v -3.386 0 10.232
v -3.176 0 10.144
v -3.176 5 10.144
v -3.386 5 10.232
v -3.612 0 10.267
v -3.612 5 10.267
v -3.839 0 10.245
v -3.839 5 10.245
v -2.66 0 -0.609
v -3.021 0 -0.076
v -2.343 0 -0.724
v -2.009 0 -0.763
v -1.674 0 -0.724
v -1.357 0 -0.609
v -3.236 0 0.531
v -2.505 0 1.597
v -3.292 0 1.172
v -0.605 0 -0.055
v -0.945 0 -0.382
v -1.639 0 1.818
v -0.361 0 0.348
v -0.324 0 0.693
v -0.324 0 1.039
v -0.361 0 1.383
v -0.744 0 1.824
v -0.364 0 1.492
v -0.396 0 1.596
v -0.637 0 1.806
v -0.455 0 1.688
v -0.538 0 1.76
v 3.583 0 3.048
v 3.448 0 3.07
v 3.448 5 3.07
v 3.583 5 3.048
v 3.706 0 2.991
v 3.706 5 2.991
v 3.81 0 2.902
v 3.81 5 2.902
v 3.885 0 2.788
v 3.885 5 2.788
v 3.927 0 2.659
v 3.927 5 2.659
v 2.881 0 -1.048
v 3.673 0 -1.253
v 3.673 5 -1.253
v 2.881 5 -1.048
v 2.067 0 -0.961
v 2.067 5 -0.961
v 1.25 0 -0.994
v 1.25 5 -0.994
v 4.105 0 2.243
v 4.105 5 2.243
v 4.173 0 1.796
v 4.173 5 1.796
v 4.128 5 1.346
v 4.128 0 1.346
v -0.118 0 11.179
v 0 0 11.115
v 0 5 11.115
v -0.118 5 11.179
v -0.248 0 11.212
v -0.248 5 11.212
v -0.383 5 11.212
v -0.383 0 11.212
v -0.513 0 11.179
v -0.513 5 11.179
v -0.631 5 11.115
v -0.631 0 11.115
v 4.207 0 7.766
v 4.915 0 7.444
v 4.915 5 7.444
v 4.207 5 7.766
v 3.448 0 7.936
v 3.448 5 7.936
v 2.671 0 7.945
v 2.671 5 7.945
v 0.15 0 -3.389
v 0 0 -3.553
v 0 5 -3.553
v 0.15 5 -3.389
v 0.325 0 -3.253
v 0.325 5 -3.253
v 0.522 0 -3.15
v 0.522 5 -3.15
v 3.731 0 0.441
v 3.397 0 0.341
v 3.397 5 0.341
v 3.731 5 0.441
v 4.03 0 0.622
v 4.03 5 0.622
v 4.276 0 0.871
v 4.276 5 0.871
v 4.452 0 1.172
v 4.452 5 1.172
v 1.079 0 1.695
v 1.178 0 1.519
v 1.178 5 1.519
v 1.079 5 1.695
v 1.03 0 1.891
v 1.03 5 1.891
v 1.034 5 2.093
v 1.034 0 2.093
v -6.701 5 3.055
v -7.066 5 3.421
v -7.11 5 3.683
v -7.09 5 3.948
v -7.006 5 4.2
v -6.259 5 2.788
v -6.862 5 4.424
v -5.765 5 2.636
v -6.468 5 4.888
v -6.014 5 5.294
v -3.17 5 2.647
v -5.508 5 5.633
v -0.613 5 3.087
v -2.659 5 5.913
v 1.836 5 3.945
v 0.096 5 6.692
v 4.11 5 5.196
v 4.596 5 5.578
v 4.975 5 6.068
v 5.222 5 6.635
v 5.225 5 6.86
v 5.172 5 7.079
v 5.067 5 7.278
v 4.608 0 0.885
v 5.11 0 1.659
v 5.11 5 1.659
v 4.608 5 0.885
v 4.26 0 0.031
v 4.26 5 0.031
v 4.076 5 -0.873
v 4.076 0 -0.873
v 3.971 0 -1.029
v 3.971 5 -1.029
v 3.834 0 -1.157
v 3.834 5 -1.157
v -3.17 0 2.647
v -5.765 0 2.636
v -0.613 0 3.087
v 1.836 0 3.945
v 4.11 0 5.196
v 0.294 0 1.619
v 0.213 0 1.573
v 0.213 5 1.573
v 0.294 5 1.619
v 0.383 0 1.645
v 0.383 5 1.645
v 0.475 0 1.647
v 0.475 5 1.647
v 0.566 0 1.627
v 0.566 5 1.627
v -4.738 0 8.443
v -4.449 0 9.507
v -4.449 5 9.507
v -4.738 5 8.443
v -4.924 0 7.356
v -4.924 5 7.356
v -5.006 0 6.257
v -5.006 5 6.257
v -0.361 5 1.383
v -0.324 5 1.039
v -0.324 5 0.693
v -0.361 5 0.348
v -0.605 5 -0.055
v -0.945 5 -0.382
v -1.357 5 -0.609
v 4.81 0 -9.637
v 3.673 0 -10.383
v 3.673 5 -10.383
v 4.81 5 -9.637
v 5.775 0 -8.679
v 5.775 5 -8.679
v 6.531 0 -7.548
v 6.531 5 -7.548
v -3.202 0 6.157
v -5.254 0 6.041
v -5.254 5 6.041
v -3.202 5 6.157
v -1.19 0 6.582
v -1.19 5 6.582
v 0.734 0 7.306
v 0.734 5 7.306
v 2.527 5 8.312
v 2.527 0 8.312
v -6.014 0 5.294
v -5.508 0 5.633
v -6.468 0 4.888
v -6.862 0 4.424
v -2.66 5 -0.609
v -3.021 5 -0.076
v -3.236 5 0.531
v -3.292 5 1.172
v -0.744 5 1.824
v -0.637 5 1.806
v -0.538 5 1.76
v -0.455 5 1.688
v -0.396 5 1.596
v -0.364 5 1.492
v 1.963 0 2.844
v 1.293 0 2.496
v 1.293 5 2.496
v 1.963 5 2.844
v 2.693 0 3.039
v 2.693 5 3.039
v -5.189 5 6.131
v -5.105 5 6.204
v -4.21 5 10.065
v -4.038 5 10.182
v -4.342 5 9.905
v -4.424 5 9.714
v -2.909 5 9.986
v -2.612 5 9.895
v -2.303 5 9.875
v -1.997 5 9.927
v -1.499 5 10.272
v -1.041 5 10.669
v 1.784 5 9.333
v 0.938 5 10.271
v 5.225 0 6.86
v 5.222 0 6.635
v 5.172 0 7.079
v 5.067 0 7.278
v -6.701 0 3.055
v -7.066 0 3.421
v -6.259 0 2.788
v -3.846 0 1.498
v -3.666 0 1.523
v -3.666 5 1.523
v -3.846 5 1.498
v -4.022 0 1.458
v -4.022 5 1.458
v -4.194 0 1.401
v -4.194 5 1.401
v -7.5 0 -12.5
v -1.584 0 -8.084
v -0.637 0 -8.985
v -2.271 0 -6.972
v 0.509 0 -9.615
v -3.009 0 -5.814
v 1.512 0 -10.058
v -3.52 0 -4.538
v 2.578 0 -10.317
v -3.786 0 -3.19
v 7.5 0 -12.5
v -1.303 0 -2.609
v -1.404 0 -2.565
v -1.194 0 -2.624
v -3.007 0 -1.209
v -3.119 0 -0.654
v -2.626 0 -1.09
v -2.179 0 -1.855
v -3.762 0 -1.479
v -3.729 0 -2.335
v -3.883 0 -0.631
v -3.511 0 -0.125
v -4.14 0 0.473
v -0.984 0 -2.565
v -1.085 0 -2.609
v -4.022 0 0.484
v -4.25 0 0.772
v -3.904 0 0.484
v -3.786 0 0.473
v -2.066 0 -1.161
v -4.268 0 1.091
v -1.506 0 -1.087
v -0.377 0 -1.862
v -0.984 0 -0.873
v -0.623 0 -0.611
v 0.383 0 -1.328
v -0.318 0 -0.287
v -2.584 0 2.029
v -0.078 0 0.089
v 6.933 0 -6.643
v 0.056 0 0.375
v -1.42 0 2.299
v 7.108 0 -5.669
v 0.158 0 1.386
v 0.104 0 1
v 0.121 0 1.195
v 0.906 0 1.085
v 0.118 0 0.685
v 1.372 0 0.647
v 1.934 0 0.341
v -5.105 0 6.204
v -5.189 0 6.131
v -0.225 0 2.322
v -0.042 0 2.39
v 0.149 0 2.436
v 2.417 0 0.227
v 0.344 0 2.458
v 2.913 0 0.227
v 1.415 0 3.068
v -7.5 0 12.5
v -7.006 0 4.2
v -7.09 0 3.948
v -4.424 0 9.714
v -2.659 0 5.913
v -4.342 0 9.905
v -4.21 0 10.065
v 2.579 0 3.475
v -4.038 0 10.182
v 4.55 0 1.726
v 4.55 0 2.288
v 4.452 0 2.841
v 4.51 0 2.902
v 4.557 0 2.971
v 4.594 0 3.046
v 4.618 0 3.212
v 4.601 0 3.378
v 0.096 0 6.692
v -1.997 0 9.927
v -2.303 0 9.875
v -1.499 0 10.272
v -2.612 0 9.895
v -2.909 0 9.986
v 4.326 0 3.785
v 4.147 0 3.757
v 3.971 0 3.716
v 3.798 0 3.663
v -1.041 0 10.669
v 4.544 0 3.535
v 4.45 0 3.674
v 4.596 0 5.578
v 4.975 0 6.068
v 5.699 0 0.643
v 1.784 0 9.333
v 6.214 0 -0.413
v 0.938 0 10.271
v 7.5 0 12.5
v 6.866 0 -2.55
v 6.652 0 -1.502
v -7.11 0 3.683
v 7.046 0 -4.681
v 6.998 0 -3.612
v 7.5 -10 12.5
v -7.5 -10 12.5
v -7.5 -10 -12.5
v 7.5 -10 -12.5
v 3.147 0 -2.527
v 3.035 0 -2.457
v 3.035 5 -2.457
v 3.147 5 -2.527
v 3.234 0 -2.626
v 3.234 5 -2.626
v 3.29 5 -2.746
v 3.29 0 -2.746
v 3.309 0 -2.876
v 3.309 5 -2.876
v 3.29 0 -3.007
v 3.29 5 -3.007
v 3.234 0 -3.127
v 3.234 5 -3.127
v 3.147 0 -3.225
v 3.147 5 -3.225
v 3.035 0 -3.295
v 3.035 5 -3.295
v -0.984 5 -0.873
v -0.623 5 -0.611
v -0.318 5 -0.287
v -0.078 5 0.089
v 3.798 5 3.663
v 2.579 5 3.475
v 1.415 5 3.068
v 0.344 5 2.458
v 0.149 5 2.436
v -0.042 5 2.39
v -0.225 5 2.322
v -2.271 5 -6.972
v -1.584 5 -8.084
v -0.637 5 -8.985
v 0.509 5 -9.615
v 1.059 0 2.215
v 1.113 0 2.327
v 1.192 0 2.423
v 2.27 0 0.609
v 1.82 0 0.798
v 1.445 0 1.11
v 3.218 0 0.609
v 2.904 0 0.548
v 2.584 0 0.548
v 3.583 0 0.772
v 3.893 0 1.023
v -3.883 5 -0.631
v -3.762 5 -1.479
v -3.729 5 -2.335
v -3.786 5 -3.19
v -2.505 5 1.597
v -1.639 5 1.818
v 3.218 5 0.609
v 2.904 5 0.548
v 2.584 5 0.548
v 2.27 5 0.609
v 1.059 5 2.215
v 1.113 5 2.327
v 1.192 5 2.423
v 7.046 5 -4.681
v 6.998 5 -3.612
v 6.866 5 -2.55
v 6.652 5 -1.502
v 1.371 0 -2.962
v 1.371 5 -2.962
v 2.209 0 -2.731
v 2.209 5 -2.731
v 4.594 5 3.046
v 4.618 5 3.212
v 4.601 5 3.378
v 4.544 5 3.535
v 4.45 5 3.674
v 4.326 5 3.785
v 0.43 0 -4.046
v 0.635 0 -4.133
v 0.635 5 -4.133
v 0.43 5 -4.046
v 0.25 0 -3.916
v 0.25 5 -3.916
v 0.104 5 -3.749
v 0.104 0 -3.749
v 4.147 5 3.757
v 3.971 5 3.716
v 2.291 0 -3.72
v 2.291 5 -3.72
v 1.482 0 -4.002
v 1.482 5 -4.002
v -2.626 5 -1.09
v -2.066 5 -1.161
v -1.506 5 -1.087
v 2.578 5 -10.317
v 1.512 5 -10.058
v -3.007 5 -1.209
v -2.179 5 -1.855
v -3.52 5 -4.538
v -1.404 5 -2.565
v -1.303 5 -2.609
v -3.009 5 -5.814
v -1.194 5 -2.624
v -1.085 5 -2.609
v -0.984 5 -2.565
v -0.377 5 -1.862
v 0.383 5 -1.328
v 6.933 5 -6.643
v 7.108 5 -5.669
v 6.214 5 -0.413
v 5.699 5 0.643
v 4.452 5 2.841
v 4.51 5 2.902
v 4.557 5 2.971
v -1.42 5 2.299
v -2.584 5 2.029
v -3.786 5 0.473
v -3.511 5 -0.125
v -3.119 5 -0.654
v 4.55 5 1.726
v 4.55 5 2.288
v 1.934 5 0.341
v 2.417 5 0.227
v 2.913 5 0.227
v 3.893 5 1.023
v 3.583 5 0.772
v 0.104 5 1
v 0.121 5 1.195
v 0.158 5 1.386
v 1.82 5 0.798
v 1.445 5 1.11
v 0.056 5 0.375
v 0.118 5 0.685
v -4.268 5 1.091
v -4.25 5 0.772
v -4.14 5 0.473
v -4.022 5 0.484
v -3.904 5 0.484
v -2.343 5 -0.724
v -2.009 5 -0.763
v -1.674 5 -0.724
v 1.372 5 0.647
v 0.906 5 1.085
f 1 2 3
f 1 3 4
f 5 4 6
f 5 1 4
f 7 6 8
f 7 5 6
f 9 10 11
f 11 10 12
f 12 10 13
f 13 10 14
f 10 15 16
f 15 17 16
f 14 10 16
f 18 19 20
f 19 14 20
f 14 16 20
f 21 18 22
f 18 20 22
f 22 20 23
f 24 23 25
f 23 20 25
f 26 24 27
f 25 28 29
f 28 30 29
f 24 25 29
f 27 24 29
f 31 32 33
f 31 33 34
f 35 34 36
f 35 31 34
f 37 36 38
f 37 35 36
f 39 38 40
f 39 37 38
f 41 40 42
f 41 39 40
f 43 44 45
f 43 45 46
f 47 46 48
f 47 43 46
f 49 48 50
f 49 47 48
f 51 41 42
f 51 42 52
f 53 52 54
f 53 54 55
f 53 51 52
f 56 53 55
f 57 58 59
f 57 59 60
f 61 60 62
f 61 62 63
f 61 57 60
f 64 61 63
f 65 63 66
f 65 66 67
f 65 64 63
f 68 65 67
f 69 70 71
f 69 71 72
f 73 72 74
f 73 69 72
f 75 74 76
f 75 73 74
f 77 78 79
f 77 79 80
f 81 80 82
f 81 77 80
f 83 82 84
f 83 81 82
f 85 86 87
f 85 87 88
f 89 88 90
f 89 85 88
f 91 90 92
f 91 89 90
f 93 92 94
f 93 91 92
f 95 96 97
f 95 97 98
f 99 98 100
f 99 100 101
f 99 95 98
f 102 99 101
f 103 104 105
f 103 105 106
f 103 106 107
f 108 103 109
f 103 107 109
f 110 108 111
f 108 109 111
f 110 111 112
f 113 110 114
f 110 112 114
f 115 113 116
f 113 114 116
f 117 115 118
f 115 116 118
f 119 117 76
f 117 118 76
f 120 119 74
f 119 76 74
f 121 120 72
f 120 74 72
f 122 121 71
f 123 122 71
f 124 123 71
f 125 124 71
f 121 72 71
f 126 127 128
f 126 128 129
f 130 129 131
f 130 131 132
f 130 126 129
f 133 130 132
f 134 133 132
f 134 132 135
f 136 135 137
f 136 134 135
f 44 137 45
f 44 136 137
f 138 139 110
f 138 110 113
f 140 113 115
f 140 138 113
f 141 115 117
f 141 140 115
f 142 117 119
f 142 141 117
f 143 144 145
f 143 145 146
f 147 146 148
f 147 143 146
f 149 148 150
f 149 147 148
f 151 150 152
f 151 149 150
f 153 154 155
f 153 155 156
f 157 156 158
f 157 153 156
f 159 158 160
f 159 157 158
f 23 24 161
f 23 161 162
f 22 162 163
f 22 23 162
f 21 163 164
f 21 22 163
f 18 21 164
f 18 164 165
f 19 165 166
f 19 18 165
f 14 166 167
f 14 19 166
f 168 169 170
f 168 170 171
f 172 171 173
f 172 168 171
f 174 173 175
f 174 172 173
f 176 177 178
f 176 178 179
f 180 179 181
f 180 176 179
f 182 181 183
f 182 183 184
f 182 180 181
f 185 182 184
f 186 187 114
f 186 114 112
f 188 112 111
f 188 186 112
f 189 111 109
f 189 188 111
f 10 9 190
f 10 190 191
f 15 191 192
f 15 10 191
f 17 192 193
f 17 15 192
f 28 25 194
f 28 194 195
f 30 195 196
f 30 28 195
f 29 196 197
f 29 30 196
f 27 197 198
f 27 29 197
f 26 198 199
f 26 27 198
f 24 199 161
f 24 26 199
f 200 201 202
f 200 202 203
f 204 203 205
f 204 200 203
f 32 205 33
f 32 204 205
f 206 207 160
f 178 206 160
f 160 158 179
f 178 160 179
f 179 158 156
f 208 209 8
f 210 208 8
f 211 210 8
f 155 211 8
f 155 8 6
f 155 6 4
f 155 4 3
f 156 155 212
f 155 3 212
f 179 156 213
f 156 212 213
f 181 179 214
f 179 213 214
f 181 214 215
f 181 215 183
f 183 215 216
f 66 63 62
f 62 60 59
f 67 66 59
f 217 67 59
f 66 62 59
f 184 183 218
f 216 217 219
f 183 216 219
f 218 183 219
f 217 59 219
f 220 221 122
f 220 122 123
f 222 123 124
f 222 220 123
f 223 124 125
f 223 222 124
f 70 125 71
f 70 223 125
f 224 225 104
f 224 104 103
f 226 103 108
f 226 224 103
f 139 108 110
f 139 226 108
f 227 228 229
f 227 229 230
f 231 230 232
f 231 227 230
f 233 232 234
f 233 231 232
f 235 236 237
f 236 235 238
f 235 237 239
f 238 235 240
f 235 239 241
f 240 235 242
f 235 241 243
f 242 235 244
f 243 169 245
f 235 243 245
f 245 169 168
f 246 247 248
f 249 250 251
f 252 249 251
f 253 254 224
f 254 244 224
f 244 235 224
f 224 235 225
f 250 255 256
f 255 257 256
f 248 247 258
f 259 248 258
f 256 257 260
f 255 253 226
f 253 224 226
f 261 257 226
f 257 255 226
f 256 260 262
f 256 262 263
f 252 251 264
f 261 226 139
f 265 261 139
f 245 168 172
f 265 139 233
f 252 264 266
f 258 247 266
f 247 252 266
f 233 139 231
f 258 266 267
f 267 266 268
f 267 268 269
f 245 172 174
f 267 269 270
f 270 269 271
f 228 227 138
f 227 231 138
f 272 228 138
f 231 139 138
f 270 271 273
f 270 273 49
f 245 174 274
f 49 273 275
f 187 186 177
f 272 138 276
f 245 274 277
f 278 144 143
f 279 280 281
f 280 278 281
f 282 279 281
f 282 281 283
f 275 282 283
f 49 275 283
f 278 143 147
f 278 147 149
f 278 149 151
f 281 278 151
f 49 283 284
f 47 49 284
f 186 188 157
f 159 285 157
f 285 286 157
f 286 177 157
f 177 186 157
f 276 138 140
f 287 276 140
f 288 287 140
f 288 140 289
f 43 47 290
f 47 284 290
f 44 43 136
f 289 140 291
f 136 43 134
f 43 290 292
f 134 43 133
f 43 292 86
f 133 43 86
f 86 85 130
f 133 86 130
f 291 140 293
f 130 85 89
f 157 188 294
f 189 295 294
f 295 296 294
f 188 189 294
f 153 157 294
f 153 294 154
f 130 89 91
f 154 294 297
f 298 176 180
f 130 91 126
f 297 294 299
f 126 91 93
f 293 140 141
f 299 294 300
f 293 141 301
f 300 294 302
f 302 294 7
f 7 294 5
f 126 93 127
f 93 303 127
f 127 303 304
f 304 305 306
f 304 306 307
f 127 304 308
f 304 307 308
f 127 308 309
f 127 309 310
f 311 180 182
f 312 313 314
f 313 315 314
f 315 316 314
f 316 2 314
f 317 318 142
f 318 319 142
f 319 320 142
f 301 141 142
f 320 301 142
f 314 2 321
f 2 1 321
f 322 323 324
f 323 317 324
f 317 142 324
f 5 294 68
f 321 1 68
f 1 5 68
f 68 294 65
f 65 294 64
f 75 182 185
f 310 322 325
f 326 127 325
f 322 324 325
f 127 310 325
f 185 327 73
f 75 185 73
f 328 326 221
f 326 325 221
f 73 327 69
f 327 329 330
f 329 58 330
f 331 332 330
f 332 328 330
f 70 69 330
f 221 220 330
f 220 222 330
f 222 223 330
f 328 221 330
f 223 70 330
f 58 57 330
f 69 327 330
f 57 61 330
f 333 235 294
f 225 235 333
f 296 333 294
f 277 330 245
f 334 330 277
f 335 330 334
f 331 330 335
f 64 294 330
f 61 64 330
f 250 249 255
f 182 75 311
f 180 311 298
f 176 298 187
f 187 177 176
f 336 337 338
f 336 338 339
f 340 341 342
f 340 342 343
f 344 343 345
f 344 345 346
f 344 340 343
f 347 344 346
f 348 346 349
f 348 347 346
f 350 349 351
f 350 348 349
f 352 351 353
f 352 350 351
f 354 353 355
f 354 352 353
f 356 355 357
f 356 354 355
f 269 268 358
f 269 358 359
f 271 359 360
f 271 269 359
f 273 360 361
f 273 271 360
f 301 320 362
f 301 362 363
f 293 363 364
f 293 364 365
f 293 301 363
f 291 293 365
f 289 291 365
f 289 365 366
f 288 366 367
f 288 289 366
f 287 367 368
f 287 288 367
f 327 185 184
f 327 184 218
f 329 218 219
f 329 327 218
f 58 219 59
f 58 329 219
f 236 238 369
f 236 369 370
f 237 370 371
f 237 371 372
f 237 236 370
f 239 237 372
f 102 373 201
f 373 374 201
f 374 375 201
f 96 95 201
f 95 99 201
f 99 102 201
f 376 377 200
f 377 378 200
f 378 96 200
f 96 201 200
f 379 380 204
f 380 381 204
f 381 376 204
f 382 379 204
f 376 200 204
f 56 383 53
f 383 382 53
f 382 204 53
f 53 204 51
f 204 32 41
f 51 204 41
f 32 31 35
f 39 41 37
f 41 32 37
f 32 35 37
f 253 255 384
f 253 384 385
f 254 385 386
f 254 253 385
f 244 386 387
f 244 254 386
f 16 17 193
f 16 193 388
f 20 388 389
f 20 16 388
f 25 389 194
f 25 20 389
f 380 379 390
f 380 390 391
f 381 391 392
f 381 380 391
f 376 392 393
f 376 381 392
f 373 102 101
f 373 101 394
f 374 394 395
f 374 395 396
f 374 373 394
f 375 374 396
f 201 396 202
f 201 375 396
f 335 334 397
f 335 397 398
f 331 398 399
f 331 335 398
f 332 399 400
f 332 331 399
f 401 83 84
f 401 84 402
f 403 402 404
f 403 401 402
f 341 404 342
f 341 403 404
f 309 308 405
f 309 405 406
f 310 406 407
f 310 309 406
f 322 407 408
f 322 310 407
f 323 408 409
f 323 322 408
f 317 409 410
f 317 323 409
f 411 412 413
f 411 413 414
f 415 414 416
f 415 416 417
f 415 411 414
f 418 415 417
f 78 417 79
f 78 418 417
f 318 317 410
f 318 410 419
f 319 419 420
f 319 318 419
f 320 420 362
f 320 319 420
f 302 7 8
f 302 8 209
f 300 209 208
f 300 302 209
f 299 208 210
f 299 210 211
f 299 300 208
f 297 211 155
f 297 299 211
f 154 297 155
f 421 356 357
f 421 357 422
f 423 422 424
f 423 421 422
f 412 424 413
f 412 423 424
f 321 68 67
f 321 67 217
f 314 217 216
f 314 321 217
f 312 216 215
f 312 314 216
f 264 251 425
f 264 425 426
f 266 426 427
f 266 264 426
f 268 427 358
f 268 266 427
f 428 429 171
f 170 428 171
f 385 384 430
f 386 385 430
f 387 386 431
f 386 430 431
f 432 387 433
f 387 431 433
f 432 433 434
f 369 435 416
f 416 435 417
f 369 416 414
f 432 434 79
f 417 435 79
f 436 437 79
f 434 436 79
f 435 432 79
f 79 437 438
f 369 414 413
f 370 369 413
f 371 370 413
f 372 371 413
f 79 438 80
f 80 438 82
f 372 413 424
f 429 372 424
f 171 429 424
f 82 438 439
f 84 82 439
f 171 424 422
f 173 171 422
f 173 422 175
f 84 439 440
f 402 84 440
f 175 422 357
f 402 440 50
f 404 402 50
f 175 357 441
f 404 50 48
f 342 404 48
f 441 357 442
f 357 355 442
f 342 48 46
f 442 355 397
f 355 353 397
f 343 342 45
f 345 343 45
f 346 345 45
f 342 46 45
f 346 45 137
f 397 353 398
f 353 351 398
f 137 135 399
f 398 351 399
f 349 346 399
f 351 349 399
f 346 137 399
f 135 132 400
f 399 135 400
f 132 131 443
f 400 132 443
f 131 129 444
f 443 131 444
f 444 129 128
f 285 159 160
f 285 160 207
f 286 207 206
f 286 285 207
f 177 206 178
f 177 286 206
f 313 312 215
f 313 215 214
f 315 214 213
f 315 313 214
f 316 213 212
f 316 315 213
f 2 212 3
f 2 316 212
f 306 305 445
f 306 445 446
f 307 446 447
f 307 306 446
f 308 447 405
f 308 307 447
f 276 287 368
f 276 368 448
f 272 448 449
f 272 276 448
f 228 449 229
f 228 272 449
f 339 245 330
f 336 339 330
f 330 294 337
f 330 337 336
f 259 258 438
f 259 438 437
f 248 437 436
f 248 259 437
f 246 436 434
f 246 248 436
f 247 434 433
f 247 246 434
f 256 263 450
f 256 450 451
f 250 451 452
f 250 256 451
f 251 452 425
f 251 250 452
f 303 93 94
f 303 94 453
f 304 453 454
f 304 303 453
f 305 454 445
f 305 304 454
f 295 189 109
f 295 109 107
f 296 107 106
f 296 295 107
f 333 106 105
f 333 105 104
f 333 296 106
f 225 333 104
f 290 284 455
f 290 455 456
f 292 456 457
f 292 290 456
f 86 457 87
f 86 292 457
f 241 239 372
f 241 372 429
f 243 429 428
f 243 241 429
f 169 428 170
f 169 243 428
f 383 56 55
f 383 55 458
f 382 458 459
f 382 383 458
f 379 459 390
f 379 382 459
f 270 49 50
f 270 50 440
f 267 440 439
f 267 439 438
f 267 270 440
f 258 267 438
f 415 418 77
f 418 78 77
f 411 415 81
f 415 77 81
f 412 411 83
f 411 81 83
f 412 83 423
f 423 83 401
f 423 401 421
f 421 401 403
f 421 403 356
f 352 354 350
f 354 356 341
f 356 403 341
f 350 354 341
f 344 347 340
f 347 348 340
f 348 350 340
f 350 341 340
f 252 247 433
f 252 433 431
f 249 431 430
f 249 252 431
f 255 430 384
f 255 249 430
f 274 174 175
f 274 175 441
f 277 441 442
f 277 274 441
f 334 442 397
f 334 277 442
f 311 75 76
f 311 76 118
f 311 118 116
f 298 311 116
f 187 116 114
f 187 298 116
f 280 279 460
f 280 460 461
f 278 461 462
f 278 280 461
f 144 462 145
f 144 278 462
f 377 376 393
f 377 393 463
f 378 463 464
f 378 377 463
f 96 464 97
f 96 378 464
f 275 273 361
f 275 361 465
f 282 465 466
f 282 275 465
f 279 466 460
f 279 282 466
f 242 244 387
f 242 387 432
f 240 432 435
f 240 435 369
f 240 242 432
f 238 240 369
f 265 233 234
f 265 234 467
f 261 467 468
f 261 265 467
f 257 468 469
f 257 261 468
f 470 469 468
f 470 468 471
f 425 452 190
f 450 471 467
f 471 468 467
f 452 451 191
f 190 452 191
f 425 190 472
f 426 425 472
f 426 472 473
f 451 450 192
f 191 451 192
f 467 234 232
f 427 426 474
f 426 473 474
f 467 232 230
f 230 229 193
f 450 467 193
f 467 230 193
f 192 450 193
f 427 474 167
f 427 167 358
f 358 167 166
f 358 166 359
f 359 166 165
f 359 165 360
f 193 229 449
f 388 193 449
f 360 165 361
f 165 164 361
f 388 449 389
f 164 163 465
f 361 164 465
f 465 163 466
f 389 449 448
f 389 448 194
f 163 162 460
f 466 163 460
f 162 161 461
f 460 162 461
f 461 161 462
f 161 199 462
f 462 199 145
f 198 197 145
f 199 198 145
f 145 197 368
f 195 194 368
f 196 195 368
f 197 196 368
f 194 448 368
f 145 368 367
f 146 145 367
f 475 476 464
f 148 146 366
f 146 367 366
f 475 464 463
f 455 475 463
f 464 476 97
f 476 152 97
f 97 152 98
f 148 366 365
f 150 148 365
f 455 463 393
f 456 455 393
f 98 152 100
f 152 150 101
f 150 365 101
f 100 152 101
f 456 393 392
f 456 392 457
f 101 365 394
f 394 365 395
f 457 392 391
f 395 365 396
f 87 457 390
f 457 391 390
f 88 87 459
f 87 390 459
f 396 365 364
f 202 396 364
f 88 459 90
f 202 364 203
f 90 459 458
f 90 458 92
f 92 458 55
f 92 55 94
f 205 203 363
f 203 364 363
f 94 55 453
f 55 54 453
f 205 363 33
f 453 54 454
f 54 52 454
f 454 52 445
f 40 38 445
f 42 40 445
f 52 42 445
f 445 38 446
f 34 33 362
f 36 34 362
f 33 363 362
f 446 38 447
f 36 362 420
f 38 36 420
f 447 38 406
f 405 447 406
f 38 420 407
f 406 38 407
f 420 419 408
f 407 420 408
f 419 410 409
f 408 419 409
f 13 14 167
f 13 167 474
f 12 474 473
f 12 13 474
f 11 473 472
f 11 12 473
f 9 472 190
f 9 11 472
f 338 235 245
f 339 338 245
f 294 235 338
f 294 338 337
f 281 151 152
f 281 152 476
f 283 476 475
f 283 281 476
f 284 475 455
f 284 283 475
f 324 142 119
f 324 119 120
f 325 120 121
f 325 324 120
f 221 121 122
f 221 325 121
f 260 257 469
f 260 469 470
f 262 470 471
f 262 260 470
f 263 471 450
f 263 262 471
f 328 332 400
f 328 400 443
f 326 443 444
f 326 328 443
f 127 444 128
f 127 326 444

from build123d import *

# Parameters (mm, degrees)
F1_DEPTH = 5
F0_W     = 15
F0_H     = 25
F2_DEPTH = 10


with BuildPart() as f1:
    # F0 (on Front) → F1 (new body)
    with BuildSketch(Plane.XZ):
        with BuildLine():
            ThreePointArc((-5.00635, 6.25683), (-5.148587, 6.169676), (-5.254236, 6.04058))
            ThreePointArc((-5.254236, 6.04058), (-1.190227, 6.581507), (2.526522, 8.311981))
            ThreePointArc((2.526522, 8.311981), (1.373353, 9.812717), (0, 11.114988))
            ThreePointArc((0, 11.114988), (-0.315443, 11.216341), (-0.630887, 11.114988))
            ThreePointArc((-0.630887, 11.114988), (-1.26458, 10.464133), (-1.997163, 9.927009))
            ThreePointArc((-1.997163, 9.927009), (-2.612192, 9.895255), (-3.175682, 10.143748))
            ThreePointArc((-3.175682, 10.143748), (-3.498132, 10.256169), (-3.839445, 10.245345))
            ThreePointArc((-3.839445, 10.245345), (-4.281874, 9.989859), (-4.449024, 9.507078))
            ThreePointArc((-4.449024, 9.507078), (-4.844139, 7.901922), (-5.00635, 6.25683))
        make_face()
        with BuildLine():
            ThreePointArc((2.670606, 7.945094), (-1.26384, 6.241031), (-5.508093, 5.632733))
            ThreePointArc((-5.508093, 5.632733), (-6.248118, 5.09859), (-6.862471, 4.42367))
            ThreePointArc((-6.862471, 4.42367), (-7.089863, 3.94796), (-7.065664, 3.421252))
            ThreePointArc((-7.065664, 3.421252), (-6.488114, 2.908136), (-5.765229, 2.635573))
            ThreePointArc((-5.765229, 2.635573), (-0.612764, 3.086873), (4.109946, 5.195803))
            ThreePointArc((4.109946, 5.195803), (4.800531, 5.811559), (5.222178, 6.635136))
            ThreePointArc((5.222178, 6.635136), (5.172476, 7.079092), (4.914622, 7.443893))
            ThreePointArc((4.914622, 7.443893), (3.831957, 7.870641), (2.670606, 7.945094))
        make_face()
        with BuildLine():
            ThreePointArc((4.326092, 3.785272), (4.058701, 3.738354), (3.797791, 3.663356))
            ThreePointArc((3.797791, 3.663356), (1.987715, 3.298177), (0.343511, 2.457745))
            ThreePointArc((0.343511, 2.457745), (0.052907, 2.415777), (-0.225429, 2.322283))
            ThreePointArc((-0.225429, 2.322283), (-2.008909, 2.194381), (-3.666162, 1.523058))
            ThreePointArc((-3.666162, 1.523058), (-3.934429, 1.479938), (-4.194464, 1.401142))
            ThreePointArc((-4.194464, 1.401142), (-4.270509, 0.930872), (-4.140103, 0.472689))
            ThreePointArc((-4.140103, 0.472689), (-3.962901, 0.485716), (-3.7857, 0.472689))
            ThreePointArc((-3.7857, 0.472689), (-3.328622, -0.399799), (-2.625836, -1.089906))
            ThreePointArc((-2.625836, -1.089906), (-1.783595, -1.14206), (-0.983671, -0.873339))
            ThreePointArc((-0.983671, -0.873339), (-0.462666, -0.45625), (-0.078091, 0.089196))
            ThreePointArc((-0.078091, 0.089196), (0.096767, 0.528088), (0.104164, 1.000472))
            ThreePointArc((0.104164, 1.000472), (0.137311, 1.290969), (0.213338, 1.573295))
            ThreePointArc((0.213338, 1.573295), (0.382624, 1.644682), (0.565539, 1.627479))
            ThreePointArc((0.565539, 1.627479), (1.124563, 0.851077), (1.933705, 0.340591))
            ThreePointArc((1.933705, 0.340591), (2.665199, 0.212113), (3.396694, 0.340591))
            ThreePointArc((3.396694, 0.340591), (4.03033, 0.621907), (4.451704, 1.172431))
            ThreePointArc((4.451704, 1.172431), (4.561944, 2.006818), (4.451704, 2.841205))
            ThreePointArc((4.451704, 2.841205), (4.534789, 2.935465), (4.59409, 3.046242))
            ThreePointArc((4.59409, 3.046242), (4.57704, 3.458166), (4.326092, 3.785272))
        make_face()
        with BuildLine():
            ThreePointArc((-3.292127, 1.172228), (-2.078587, 1.734229), (-0.744217, 1.823573))
            ThreePointArc((-0.744217, 1.823573), (-0.455411, 1.687817), (-0.361073, 1.382957))
            ThreePointArc((-0.361073, 1.382957), (-0.319095, 0.865713), (-0.361073, 0.348468))
            ThreePointArc((-0.361073, 0.348468), (-0.764044, -0.229384), (-1.357248, -0.609393))
            ThreePointArc((-1.357248, -0.609393), (-2.008593, -0.762776), (-2.659938, -0.609393))
            ThreePointArc((-2.659938, -0.609393), (-3.147515, 0.220569), (-3.292127, 1.172228))
        make_face(mode=Mode.SUBTRACT)
        with BuildLine():
            ThreePointArc((1.293098, 2.495719), (2.323148, 2.961362), (3.448284, 3.070435))
            ThreePointArc((3.448284, 3.070435), (3.761202, 2.949906), (3.927214, 2.658555))
            ThreePointArc((3.927214, 2.658555), (4.153042, 2.02162), (4.128365, 1.346286))
            ThreePointArc((4.128365, 1.346286), (3.746392, 0.887432), (3.218397, 0.608734))
            ThreePointArc((3.218397, 0.608734), (2.744257, 0.54014), (2.270116, 0.608734))
            ThreePointArc((2.270116, 0.608734), (1.621266, 0.940275), (1.178154, 1.518701))
            ThreePointArc((1.178154, 1.518701), (1.04759, 1.791378), (1.034475, 2.093418))
            ThreePointArc((1.034475, 2.093418), (1.112689, 2.327417), (1.293098, 2.495719))
        make_face(mode=Mode.SUBTRACT)
        with BuildLine():
            ThreePointArc((7.046108, -4.680553), (6.942587, -3.07977), (6.65222, -1.502143))
            ThreePointArc((6.65222, -1.502143), (5.965912, 0.119684), (5.110065, 1.658797))
            ThreePointArc((5.110065, 1.658797), (4.414011, 0.465781), (4.075576, -0.873339))
            ThreePointArc((4.075576, -0.873339), (3.905919, -1.096582), (3.673274, -1.253099))
            ThreePointArc((3.673274, -1.253099), (2.475908, -0.989532), (1.249887, -0.994476))
            ThreePointArc((1.249887, -0.994476), (-0.013374, -1.571538), (-0.983671, -2.565193))
            ThreePointArc((-0.983671, -2.565193), (-1.194019, -2.623805), (-1.404368, -2.565193))
            ThreePointArc((-1.404368, -2.565193), (-2.586189, -1.524063), (-3.883399, -0.630811))
            ThreePointArc((-3.883399, -0.630811), (-3.73441, -1.906811), (-3.7857, -3.190456))
            ThreePointArc((-3.7857, -3.190456), (-3.294549, -5.188033), (-2.270776, -6.97225))
            ThreePointArc((-2.270776, -6.97225), (-1.139444, -8.565327), (0.508615, -9.61495))
            ThreePointArc((0.508615, -9.61495), (2.039521, -10.210907), (3.673274, -10.38322))
            ThreePointArc((3.673274, -10.38322), (5.316456, -9.181794), (6.530613, -7.547996))
            ThreePointArc((6.530613, -7.547996), (7.049669, -6.161251), (7.046108, -4.680553))
        make_face()
        with BuildLine():
            ThreePointArc((0, -3.552907), (0.234527, -3.317322), (0.52187, -3.150176))
            ThreePointArc((0.52187, -3.150176), (1.791623, -2.851839), (3.034909, -2.457479))
            ThreePointArc((3.034909, -2.457479), (3.308767, -2.876319), (3.034909, -3.295159))
            ThreePointArc((3.034909, -3.295159), (1.892551, -3.879557), (0.634635, -4.132839))
            ThreePointArc((0.634635, -4.132839), (0.250354, -3.916153), (0, -3.552907))
        make_face(mode=Mode.SUBTRACT)
    extrude(amount=-F1_DEPTH)

    # F0 (on Front) → F2 (join)
    with BuildSketch(Plane.XZ):
        Rectangle(F0_W, F0_H)
        with BuildLine():
            ThreePointArc((5.110065, 1.658797), (5.965912, 0.119684), (6.65222, -1.502143))
            ThreePointArc((6.65222, -1.502143), (6.942587, -3.07977), (7.046108, -4.680553))
            ThreePointArc((7.046108, -4.680553), (7.049669, -6.161251), (6.530613, -7.547996))
            ThreePointArc((6.530613, -7.547996), (5.316456, -9.181794), (3.673274, -10.38322))
            ThreePointArc((3.673274, -10.38322), (2.039521, -10.210907), (0.508615, -9.61495))
            ThreePointArc((0.508615, -9.61495), (-1.139444, -8.565327), (-2.270776, -6.97225))
            ThreePointArc((-2.270776, -6.97225), (-3.294549, -5.188033), (-3.7857, -3.190456))
            ThreePointArc((-3.7857, -3.190456), (-3.73441, -1.906811), (-3.883399, -0.630811))
            ThreePointArc((-3.883399, -0.630811), (-2.586189, -1.524063), (-1.404368, -2.565193))
            ThreePointArc((-1.404368, -2.565193), (-1.194019, -2.623805), (-0.983671, -2.565193))
            ThreePointArc((-0.983671, -2.565193), (-0.013374, -1.571538), (1.249887, -0.994476))
            ThreePointArc((1.249887, -0.994476), (2.475908, -0.989532), (3.673274, -1.253099))
            ThreePointArc((3.673274, -1.253099), (3.905919, -1.096582), (4.075576, -0.873339))
            ThreePointArc((4.075576, -0.873339), (4.414011, 0.465781), (5.110065, 1.658797))
        make_face(mode=Mode.SUBTRACT)
        with BuildLine():
            ThreePointArc((-6.862471, 4.42367), (-6.248118, 5.09859), (-5.508093, 5.632733))
            ThreePointArc((-5.508093, 5.632733), (-1.26384, 6.241031), (2.670606, 7.945094))
            ThreePointArc((2.670606, 7.945094), (3.831957, 7.870641), (4.914622, 7.443893))
            ThreePointArc((4.914622, 7.443893), (5.172476, 7.079092), (5.222178, 6.635136))
            ThreePointArc((5.222178, 6.635136), (4.800531, 5.811559), (4.109946, 5.195803))
            ThreePointArc((4.109946, 5.195803), (-0.612764, 3.086873), (-5.765229, 2.635573))
            ThreePointArc((-5.765229, 2.635573), (-6.488114, 2.908136), (-7.065664, 3.421252))
            ThreePointArc((-7.065664, 3.421252), (-7.089863, 3.94796), (-6.862471, 4.42367))
        make_face(mode=Mode.SUBTRACT)
        with BuildLine():
            ThreePointArc((2.526522, 8.311981), (-1.190227, 6.581507), (-5.254236, 6.04058))
            ThreePointArc((-5.254236, 6.04058), (-5.148587, 6.169676), (-5.00635, 6.25683))
            ThreePointArc((-5.00635, 6.25683), (-4.844139, 7.901922), (-4.449024, 9.507078))
            ThreePointArc((-4.449024, 9.507078), (-4.281874, 9.989859), (-3.839445, 10.245345))
            ThreePointArc((-3.839445, 10.245345), (-3.498132, 10.256169), (-3.175682, 10.143748))
            ThreePointArc((-3.175682, 10.143748), (-2.612192, 9.895255), (-1.997163, 9.927009))
            ThreePointArc((-1.997163, 9.927009), (-1.26458, 10.464133), (-0.630887, 11.114988))
            ThreePointArc((-0.630887, 11.114988), (-0.315443, 11.216341), (0, 11.114988))
            ThreePointArc((0, 11.114988), (1.373353, 9.812717), (2.526522, 8.311981))
        make_face(mode=Mode.SUBTRACT)
        with BuildLine():
            ThreePointArc((0.343511, 2.457745), (1.987715, 3.298177), (3.797791, 3.663356))
            ThreePointArc((3.797791, 3.663356), (4.058701, 3.738354), (4.326092, 3.785272))
            ThreePointArc((4.326092, 3.785272), (4.57704, 3.458166), (4.59409, 3.046242))
            ThreePointArc((4.59409, 3.046242), (4.534789, 2.935465), (4.451704, 2.841205))
            ThreePointArc((4.451704, 2.841205), (4.561944, 2.006818), (4.451704, 1.172431))
            ThreePointArc((4.451704, 1.172431), (4.03033, 0.621907), (3.396694, 0.340591))
            ThreePointArc((3.396694, 0.340591), (2.665199, 0.212113), (1.933705, 0.340591))
            ThreePointArc((1.933705, 0.340591), (1.124563, 0.851077), (0.565539, 1.627479))
            ThreePointArc((0.565539, 1.627479), (0.382624, 1.644682), (0.213338, 1.573295))
            ThreePointArc((0.213338, 1.573295), (0.137311, 1.290969), (0.104164, 1.000472))
            ThreePointArc((0.104164, 1.000472), (0.096767, 0.528088), (-0.078091, 0.089196))
            ThreePointArc((-0.078091, 0.089196), (-0.462666, -0.45625), (-0.983671, -0.873339))
            ThreePointArc((-0.983671, -0.873339), (-1.783595, -1.14206), (-2.625836, -1.089906))
            ThreePointArc((-2.625836, -1.089906), (-3.328622, -0.399799), (-3.7857, 0.472689))
            ThreePointArc((-3.7857, 0.472689), (-3.962901, 0.485716), (-4.140103, 0.472689))
            ThreePointArc((-4.140103, 0.472689), (-4.270509, 0.930872), (-4.194464, 1.401142))
            ThreePointArc((-4.194464, 1.401142), (-3.934429, 1.479938), (-3.666162, 1.523058))
            ThreePointArc((-3.666162, 1.523058), (-2.008909, 2.194381), (-0.225429, 2.322283))
            ThreePointArc((-0.225429, 2.322283), (0.052907, 2.415777), (0.343511, 2.457745))
        make_face(mode=Mode.SUBTRACT)
        with BuildLine():
            ThreePointArc((-5.00635, 6.25683), (-5.148587, 6.169676), (-5.254236, 6.04058))
            ThreePointArc((-5.254236, 6.04058), (-1.190227, 6.581507), (2.526522, 8.311981))
            ThreePointArc((2.526522, 8.311981), (1.373353, 9.812717), (0, 11.114988))
            ThreePointArc((0, 11.114988), (-0.315443, 11.216341), (-0.630887, 11.114988))
            ThreePointArc((-0.630887, 11.114988), (-1.26458, 10.464133), (-1.997163, 9.927009))
            ThreePointArc((-1.997163, 9.927009), (-2.612192, 9.895255), (-3.175682, 10.143748))
            ThreePointArc((-3.175682, 10.143748), (-3.498132, 10.256169), (-3.839445, 10.245345))
            ThreePointArc((-3.839445, 10.245345), (-4.281874, 9.989859), (-4.449024, 9.507078))
            ThreePointArc((-4.449024, 9.507078), (-4.844139, 7.901922), (-5.00635, 6.25683))
        make_face()
        with BuildLine():
            ThreePointArc((2.670606, 7.945094), (-1.26384, 6.241031), (-5.508093, 5.632733))
            ThreePointArc((-5.508093, 5.632733), (-6.248118, 5.09859), (-6.862471, 4.42367))
            ThreePointArc((-6.862471, 4.42367), (-7.089863, 3.94796), (-7.065664, 3.421252))
            ThreePointArc((-7.065664, 3.421252), (-6.488114, 2.908136), (-5.765229, 2.635573))
            ThreePointArc((-5.765229, 2.635573), (-0.612764, 3.086873), (4.109946, 5.195803))
            ThreePointArc((4.109946, 5.195803), (4.800531, 5.811559), (5.222178, 6.635136))
            ThreePointArc((5.222178, 6.635136), (5.172476, 7.079092), (4.914622, 7.443893))
            ThreePointArc((4.914622, 7.443893), (3.831957, 7.870641), (2.670606, 7.945094))
        make_face()
        with BuildLine():
            ThreePointArc((4.326092, 3.785272), (4.058701, 3.738354), (3.797791, 3.663356))
            ThreePointArc((3.797791, 3.663356), (1.987715, 3.298177), (0.343511, 2.457745))
            ThreePointArc((0.343511, 2.457745), (0.052907, 2.415777), (-0.225429, 2.322283))
            ThreePointArc((-0.225429, 2.322283), (-2.008909, 2.194381), (-3.666162, 1.523058))
            ThreePointArc((-3.666162, 1.523058), (-3.934429, 1.479938), (-4.194464, 1.401142))
            ThreePointArc((-4.194464, 1.401142), (-4.270509, 0.930872), (-4.140103, 0.472689))
            ThreePointArc((-4.140103, 0.472689), (-3.962901, 0.485716), (-3.7857, 0.472689))
            ThreePointArc((-3.7857, 0.472689), (-3.328622, -0.399799), (-2.625836, -1.089906))
            ThreePointArc((-2.625836, -1.089906), (-1.783595, -1.14206), (-0.983671, -0.873339))
            ThreePointArc((-0.983671, -0.873339), (-0.462666, -0.45625), (-0.078091, 0.089196))
            ThreePointArc((-0.078091, 0.089196), (0.096767, 0.528088), (0.104164, 1.000472))
            ThreePointArc((0.104164, 1.000472), (0.137311, 1.290969), (0.213338, 1.573295))
            ThreePointArc((0.213338, 1.573295), (0.382624, 1.644682), (0.565539, 1.627479))
            ThreePointArc((0.565539, 1.627479), (1.124563, 0.851077), (1.933705, 0.340591))
            ThreePointArc((1.933705, 0.340591), (2.665199, 0.212113), (3.396694, 0.340591))
            ThreePointArc((3.396694, 0.340591), (4.03033, 0.621907), (4.451704, 1.172431))
            ThreePointArc((4.451704, 1.172431), (4.561944, 2.006818), (4.451704, 2.841205))
            ThreePointArc((4.451704, 2.841205), (4.534789, 2.935465), (4.59409, 3.046242))
            ThreePointArc((4.59409, 3.046242), (4.57704, 3.458166), (4.326092, 3.785272))
        make_face()
        with BuildLine():
            ThreePointArc((-3.292127, 1.172228), (-2.078587, 1.734229), (-0.744217, 1.823573))
            ThreePointArc((-0.744217, 1.823573), (-0.455411, 1.687817), (-0.361073, 1.382957))
            ThreePointArc((-0.361073, 1.382957), (-0.319095, 0.865713), (-0.361073, 0.348468))
            ThreePointArc((-0.361073, 0.348468), (-0.764044, -0.229384), (-1.357248, -0.609393))
            ThreePointArc((-1.357248, -0.609393), (-2.008593, -0.762776), (-2.659938, -0.609393))
            ThreePointArc((-2.659938, -0.609393), (-3.147515, 0.220569), (-3.292127, 1.172228))
        make_face(mode=Mode.SUBTRACT)
        with BuildLine():
            ThreePointArc((1.293098, 2.495719), (2.323148, 2.961362), (3.448284, 3.070435))
            ThreePointArc((3.448284, 3.070435), (3.761202, 2.949906), (3.927214, 2.658555))
            ThreePointArc((3.927214, 2.658555), (4.153042, 2.02162), (4.128365, 1.346286))
            ThreePointArc((4.128365, 1.346286), (3.746392, 0.887432), (3.218397, 0.608734))
            ThreePointArc((3.218397, 0.608734), (2.744257, 0.54014), (2.270116, 0.608734))
            ThreePointArc((2.270116, 0.608734), (1.621266, 0.940275), (1.178154, 1.518701))
            ThreePointArc((1.178154, 1.518701), (1.04759, 1.791378), (1.034475, 2.093418))
            ThreePointArc((1.034475, 2.093418), (1.112689, 2.327417), (1.293098, 2.495719))
        make_face(mode=Mode.SUBTRACT)
        with BuildLine():
            ThreePointArc((7.046108, -4.680553), (6.942587, -3.07977), (6.65222, -1.502143))
            ThreePointArc((6.65222, -1.502143), (5.965912, 0.119684), (5.110065, 1.658797))
            ThreePointArc((5.110065, 1.658797), (4.414011, 0.465781), (4.075576, -0.873339))
            ThreePointArc((4.075576, -0.873339), (3.905919, -1.096582), (3.673274, -1.253099))
            ThreePointArc((3.673274, -1.253099), (2.475908, -0.989532), (1.249887, -0.994476))
            ThreePointArc((1.249887, -0.994476), (-0.013374, -1.571538), (-0.983671, -2.565193))
            ThreePointArc((-0.983671, -2.565193), (-1.194019, -2.623805), (-1.404368, -2.565193))
            ThreePointArc((-1.404368, -2.565193), (-2.586189, -1.524063), (-3.883399, -0.630811))
            ThreePointArc((-3.883399, -0.630811), (-3.73441, -1.906811), (-3.7857, -3.190456))
            ThreePointArc((-3.7857, -3.190456), (-3.294549, -5.188033), (-2.270776, -6.97225))
            ThreePointArc((-2.270776, -6.97225), (-1.139444, -8.565327), (0.508615, -9.61495))
            ThreePointArc((0.508615, -9.61495), (2.039521, -10.210907), (3.673274, -10.38322))
            ThreePointArc((3.673274, -10.38322), (5.316456, -9.181794), (6.530613, -7.547996))
            ThreePointArc((6.530613, -7.547996), (7.049669, -6.161251), (7.046108, -4.680553))
        make_face()
        with BuildLine():
            ThreePointArc((0, -3.552907), (0.234527, -3.317322), (0.52187, -3.150176))
            ThreePointArc((0.52187, -3.150176), (1.791623, -2.851839), (3.034909, -2.457479))
            ThreePointArc((3.034909, -2.457479), (3.308767, -2.876319), (3.034909, -3.295159))
            ThreePointArc((3.034909, -3.295159), (1.892551, -3.879557), (0.634635, -4.132839))
            ThreePointArc((0.634635, -4.132839), (0.250354, -3.916153), (0, -3.552907))
        make_face(mode=Mode.SUBTRACT)
        with BuildLine():
            ThreePointArc((3.034909, -2.457479), (1.791623, -2.851839), (0.52187, -3.150176))
            ThreePointArc((0.52187, -3.150176), (0.234527, -3.317322), (0, -3.552907))
            ThreePointArc((0, -3.552907), (0.250354, -3.916153), (0.634635, -4.132839))
            ThreePointArc((0.634635, -4.132839), (1.892551, -3.879557), (3.034909, -3.295159))
            ThreePointArc((3.034909, -3.295159), (3.308767, -2.876319), (3.034909, -2.457479))
        make_face()
        with BuildLine():
            ThreePointArc((-0.361073, 1.382957), (-0.455411, 1.687817), (-0.744217, 1.823573))
            ThreePointArc((-0.744217, 1.823573), (-2.078587, 1.734229), (-3.292127, 1.172228))
            ThreePointArc((-3.292127, 1.172228), (-3.147515, 0.220569), (-2.659938, -0.609393))
            ThreePointArc((-2.659938, -0.609393), (-2.008593, -0.762776), (-1.357248, -0.609393))
            ThreePointArc((-1.357248, -0.609393), (-0.764044, -0.229384), (-0.361073, 0.348468))
            ThreePointArc((-0.361073, 0.348468), (-0.319095, 0.865713), (-0.361073, 1.382957))
        make_face()
        with BuildLine():
            ThreePointArc((3.927214, 2.658555), (3.761202, 2.949906), (3.448284, 3.070435))
            ThreePointArc((3.448284, 3.070435), (2.323148, 2.961362), (1.293098, 2.495719))
            ThreePointArc((1.293098, 2.495719), (1.112689, 2.327417), (1.034475, 2.093418))
            ThreePointArc((1.034475, 2.093418), (1.04759, 1.791378), (1.178154, 1.518701))
            ThreePointArc((1.178154, 1.518701), (1.621266, 0.940275), (2.270116, 0.608734))
            ThreePointArc((2.270116, 0.608734), (2.744257, 0.54014), (3.218397, 0.608734))
            ThreePointArc((3.218397, 0.608734), (3.746392, 0.887432), (4.128365, 1.346286))
            ThreePointArc((4.128365, 1.346286), (4.153042, 2.02162), (3.927214, 2.658555))
        make_face()
    extrude(amount=F2_DEPTH)


solid = f1.part
